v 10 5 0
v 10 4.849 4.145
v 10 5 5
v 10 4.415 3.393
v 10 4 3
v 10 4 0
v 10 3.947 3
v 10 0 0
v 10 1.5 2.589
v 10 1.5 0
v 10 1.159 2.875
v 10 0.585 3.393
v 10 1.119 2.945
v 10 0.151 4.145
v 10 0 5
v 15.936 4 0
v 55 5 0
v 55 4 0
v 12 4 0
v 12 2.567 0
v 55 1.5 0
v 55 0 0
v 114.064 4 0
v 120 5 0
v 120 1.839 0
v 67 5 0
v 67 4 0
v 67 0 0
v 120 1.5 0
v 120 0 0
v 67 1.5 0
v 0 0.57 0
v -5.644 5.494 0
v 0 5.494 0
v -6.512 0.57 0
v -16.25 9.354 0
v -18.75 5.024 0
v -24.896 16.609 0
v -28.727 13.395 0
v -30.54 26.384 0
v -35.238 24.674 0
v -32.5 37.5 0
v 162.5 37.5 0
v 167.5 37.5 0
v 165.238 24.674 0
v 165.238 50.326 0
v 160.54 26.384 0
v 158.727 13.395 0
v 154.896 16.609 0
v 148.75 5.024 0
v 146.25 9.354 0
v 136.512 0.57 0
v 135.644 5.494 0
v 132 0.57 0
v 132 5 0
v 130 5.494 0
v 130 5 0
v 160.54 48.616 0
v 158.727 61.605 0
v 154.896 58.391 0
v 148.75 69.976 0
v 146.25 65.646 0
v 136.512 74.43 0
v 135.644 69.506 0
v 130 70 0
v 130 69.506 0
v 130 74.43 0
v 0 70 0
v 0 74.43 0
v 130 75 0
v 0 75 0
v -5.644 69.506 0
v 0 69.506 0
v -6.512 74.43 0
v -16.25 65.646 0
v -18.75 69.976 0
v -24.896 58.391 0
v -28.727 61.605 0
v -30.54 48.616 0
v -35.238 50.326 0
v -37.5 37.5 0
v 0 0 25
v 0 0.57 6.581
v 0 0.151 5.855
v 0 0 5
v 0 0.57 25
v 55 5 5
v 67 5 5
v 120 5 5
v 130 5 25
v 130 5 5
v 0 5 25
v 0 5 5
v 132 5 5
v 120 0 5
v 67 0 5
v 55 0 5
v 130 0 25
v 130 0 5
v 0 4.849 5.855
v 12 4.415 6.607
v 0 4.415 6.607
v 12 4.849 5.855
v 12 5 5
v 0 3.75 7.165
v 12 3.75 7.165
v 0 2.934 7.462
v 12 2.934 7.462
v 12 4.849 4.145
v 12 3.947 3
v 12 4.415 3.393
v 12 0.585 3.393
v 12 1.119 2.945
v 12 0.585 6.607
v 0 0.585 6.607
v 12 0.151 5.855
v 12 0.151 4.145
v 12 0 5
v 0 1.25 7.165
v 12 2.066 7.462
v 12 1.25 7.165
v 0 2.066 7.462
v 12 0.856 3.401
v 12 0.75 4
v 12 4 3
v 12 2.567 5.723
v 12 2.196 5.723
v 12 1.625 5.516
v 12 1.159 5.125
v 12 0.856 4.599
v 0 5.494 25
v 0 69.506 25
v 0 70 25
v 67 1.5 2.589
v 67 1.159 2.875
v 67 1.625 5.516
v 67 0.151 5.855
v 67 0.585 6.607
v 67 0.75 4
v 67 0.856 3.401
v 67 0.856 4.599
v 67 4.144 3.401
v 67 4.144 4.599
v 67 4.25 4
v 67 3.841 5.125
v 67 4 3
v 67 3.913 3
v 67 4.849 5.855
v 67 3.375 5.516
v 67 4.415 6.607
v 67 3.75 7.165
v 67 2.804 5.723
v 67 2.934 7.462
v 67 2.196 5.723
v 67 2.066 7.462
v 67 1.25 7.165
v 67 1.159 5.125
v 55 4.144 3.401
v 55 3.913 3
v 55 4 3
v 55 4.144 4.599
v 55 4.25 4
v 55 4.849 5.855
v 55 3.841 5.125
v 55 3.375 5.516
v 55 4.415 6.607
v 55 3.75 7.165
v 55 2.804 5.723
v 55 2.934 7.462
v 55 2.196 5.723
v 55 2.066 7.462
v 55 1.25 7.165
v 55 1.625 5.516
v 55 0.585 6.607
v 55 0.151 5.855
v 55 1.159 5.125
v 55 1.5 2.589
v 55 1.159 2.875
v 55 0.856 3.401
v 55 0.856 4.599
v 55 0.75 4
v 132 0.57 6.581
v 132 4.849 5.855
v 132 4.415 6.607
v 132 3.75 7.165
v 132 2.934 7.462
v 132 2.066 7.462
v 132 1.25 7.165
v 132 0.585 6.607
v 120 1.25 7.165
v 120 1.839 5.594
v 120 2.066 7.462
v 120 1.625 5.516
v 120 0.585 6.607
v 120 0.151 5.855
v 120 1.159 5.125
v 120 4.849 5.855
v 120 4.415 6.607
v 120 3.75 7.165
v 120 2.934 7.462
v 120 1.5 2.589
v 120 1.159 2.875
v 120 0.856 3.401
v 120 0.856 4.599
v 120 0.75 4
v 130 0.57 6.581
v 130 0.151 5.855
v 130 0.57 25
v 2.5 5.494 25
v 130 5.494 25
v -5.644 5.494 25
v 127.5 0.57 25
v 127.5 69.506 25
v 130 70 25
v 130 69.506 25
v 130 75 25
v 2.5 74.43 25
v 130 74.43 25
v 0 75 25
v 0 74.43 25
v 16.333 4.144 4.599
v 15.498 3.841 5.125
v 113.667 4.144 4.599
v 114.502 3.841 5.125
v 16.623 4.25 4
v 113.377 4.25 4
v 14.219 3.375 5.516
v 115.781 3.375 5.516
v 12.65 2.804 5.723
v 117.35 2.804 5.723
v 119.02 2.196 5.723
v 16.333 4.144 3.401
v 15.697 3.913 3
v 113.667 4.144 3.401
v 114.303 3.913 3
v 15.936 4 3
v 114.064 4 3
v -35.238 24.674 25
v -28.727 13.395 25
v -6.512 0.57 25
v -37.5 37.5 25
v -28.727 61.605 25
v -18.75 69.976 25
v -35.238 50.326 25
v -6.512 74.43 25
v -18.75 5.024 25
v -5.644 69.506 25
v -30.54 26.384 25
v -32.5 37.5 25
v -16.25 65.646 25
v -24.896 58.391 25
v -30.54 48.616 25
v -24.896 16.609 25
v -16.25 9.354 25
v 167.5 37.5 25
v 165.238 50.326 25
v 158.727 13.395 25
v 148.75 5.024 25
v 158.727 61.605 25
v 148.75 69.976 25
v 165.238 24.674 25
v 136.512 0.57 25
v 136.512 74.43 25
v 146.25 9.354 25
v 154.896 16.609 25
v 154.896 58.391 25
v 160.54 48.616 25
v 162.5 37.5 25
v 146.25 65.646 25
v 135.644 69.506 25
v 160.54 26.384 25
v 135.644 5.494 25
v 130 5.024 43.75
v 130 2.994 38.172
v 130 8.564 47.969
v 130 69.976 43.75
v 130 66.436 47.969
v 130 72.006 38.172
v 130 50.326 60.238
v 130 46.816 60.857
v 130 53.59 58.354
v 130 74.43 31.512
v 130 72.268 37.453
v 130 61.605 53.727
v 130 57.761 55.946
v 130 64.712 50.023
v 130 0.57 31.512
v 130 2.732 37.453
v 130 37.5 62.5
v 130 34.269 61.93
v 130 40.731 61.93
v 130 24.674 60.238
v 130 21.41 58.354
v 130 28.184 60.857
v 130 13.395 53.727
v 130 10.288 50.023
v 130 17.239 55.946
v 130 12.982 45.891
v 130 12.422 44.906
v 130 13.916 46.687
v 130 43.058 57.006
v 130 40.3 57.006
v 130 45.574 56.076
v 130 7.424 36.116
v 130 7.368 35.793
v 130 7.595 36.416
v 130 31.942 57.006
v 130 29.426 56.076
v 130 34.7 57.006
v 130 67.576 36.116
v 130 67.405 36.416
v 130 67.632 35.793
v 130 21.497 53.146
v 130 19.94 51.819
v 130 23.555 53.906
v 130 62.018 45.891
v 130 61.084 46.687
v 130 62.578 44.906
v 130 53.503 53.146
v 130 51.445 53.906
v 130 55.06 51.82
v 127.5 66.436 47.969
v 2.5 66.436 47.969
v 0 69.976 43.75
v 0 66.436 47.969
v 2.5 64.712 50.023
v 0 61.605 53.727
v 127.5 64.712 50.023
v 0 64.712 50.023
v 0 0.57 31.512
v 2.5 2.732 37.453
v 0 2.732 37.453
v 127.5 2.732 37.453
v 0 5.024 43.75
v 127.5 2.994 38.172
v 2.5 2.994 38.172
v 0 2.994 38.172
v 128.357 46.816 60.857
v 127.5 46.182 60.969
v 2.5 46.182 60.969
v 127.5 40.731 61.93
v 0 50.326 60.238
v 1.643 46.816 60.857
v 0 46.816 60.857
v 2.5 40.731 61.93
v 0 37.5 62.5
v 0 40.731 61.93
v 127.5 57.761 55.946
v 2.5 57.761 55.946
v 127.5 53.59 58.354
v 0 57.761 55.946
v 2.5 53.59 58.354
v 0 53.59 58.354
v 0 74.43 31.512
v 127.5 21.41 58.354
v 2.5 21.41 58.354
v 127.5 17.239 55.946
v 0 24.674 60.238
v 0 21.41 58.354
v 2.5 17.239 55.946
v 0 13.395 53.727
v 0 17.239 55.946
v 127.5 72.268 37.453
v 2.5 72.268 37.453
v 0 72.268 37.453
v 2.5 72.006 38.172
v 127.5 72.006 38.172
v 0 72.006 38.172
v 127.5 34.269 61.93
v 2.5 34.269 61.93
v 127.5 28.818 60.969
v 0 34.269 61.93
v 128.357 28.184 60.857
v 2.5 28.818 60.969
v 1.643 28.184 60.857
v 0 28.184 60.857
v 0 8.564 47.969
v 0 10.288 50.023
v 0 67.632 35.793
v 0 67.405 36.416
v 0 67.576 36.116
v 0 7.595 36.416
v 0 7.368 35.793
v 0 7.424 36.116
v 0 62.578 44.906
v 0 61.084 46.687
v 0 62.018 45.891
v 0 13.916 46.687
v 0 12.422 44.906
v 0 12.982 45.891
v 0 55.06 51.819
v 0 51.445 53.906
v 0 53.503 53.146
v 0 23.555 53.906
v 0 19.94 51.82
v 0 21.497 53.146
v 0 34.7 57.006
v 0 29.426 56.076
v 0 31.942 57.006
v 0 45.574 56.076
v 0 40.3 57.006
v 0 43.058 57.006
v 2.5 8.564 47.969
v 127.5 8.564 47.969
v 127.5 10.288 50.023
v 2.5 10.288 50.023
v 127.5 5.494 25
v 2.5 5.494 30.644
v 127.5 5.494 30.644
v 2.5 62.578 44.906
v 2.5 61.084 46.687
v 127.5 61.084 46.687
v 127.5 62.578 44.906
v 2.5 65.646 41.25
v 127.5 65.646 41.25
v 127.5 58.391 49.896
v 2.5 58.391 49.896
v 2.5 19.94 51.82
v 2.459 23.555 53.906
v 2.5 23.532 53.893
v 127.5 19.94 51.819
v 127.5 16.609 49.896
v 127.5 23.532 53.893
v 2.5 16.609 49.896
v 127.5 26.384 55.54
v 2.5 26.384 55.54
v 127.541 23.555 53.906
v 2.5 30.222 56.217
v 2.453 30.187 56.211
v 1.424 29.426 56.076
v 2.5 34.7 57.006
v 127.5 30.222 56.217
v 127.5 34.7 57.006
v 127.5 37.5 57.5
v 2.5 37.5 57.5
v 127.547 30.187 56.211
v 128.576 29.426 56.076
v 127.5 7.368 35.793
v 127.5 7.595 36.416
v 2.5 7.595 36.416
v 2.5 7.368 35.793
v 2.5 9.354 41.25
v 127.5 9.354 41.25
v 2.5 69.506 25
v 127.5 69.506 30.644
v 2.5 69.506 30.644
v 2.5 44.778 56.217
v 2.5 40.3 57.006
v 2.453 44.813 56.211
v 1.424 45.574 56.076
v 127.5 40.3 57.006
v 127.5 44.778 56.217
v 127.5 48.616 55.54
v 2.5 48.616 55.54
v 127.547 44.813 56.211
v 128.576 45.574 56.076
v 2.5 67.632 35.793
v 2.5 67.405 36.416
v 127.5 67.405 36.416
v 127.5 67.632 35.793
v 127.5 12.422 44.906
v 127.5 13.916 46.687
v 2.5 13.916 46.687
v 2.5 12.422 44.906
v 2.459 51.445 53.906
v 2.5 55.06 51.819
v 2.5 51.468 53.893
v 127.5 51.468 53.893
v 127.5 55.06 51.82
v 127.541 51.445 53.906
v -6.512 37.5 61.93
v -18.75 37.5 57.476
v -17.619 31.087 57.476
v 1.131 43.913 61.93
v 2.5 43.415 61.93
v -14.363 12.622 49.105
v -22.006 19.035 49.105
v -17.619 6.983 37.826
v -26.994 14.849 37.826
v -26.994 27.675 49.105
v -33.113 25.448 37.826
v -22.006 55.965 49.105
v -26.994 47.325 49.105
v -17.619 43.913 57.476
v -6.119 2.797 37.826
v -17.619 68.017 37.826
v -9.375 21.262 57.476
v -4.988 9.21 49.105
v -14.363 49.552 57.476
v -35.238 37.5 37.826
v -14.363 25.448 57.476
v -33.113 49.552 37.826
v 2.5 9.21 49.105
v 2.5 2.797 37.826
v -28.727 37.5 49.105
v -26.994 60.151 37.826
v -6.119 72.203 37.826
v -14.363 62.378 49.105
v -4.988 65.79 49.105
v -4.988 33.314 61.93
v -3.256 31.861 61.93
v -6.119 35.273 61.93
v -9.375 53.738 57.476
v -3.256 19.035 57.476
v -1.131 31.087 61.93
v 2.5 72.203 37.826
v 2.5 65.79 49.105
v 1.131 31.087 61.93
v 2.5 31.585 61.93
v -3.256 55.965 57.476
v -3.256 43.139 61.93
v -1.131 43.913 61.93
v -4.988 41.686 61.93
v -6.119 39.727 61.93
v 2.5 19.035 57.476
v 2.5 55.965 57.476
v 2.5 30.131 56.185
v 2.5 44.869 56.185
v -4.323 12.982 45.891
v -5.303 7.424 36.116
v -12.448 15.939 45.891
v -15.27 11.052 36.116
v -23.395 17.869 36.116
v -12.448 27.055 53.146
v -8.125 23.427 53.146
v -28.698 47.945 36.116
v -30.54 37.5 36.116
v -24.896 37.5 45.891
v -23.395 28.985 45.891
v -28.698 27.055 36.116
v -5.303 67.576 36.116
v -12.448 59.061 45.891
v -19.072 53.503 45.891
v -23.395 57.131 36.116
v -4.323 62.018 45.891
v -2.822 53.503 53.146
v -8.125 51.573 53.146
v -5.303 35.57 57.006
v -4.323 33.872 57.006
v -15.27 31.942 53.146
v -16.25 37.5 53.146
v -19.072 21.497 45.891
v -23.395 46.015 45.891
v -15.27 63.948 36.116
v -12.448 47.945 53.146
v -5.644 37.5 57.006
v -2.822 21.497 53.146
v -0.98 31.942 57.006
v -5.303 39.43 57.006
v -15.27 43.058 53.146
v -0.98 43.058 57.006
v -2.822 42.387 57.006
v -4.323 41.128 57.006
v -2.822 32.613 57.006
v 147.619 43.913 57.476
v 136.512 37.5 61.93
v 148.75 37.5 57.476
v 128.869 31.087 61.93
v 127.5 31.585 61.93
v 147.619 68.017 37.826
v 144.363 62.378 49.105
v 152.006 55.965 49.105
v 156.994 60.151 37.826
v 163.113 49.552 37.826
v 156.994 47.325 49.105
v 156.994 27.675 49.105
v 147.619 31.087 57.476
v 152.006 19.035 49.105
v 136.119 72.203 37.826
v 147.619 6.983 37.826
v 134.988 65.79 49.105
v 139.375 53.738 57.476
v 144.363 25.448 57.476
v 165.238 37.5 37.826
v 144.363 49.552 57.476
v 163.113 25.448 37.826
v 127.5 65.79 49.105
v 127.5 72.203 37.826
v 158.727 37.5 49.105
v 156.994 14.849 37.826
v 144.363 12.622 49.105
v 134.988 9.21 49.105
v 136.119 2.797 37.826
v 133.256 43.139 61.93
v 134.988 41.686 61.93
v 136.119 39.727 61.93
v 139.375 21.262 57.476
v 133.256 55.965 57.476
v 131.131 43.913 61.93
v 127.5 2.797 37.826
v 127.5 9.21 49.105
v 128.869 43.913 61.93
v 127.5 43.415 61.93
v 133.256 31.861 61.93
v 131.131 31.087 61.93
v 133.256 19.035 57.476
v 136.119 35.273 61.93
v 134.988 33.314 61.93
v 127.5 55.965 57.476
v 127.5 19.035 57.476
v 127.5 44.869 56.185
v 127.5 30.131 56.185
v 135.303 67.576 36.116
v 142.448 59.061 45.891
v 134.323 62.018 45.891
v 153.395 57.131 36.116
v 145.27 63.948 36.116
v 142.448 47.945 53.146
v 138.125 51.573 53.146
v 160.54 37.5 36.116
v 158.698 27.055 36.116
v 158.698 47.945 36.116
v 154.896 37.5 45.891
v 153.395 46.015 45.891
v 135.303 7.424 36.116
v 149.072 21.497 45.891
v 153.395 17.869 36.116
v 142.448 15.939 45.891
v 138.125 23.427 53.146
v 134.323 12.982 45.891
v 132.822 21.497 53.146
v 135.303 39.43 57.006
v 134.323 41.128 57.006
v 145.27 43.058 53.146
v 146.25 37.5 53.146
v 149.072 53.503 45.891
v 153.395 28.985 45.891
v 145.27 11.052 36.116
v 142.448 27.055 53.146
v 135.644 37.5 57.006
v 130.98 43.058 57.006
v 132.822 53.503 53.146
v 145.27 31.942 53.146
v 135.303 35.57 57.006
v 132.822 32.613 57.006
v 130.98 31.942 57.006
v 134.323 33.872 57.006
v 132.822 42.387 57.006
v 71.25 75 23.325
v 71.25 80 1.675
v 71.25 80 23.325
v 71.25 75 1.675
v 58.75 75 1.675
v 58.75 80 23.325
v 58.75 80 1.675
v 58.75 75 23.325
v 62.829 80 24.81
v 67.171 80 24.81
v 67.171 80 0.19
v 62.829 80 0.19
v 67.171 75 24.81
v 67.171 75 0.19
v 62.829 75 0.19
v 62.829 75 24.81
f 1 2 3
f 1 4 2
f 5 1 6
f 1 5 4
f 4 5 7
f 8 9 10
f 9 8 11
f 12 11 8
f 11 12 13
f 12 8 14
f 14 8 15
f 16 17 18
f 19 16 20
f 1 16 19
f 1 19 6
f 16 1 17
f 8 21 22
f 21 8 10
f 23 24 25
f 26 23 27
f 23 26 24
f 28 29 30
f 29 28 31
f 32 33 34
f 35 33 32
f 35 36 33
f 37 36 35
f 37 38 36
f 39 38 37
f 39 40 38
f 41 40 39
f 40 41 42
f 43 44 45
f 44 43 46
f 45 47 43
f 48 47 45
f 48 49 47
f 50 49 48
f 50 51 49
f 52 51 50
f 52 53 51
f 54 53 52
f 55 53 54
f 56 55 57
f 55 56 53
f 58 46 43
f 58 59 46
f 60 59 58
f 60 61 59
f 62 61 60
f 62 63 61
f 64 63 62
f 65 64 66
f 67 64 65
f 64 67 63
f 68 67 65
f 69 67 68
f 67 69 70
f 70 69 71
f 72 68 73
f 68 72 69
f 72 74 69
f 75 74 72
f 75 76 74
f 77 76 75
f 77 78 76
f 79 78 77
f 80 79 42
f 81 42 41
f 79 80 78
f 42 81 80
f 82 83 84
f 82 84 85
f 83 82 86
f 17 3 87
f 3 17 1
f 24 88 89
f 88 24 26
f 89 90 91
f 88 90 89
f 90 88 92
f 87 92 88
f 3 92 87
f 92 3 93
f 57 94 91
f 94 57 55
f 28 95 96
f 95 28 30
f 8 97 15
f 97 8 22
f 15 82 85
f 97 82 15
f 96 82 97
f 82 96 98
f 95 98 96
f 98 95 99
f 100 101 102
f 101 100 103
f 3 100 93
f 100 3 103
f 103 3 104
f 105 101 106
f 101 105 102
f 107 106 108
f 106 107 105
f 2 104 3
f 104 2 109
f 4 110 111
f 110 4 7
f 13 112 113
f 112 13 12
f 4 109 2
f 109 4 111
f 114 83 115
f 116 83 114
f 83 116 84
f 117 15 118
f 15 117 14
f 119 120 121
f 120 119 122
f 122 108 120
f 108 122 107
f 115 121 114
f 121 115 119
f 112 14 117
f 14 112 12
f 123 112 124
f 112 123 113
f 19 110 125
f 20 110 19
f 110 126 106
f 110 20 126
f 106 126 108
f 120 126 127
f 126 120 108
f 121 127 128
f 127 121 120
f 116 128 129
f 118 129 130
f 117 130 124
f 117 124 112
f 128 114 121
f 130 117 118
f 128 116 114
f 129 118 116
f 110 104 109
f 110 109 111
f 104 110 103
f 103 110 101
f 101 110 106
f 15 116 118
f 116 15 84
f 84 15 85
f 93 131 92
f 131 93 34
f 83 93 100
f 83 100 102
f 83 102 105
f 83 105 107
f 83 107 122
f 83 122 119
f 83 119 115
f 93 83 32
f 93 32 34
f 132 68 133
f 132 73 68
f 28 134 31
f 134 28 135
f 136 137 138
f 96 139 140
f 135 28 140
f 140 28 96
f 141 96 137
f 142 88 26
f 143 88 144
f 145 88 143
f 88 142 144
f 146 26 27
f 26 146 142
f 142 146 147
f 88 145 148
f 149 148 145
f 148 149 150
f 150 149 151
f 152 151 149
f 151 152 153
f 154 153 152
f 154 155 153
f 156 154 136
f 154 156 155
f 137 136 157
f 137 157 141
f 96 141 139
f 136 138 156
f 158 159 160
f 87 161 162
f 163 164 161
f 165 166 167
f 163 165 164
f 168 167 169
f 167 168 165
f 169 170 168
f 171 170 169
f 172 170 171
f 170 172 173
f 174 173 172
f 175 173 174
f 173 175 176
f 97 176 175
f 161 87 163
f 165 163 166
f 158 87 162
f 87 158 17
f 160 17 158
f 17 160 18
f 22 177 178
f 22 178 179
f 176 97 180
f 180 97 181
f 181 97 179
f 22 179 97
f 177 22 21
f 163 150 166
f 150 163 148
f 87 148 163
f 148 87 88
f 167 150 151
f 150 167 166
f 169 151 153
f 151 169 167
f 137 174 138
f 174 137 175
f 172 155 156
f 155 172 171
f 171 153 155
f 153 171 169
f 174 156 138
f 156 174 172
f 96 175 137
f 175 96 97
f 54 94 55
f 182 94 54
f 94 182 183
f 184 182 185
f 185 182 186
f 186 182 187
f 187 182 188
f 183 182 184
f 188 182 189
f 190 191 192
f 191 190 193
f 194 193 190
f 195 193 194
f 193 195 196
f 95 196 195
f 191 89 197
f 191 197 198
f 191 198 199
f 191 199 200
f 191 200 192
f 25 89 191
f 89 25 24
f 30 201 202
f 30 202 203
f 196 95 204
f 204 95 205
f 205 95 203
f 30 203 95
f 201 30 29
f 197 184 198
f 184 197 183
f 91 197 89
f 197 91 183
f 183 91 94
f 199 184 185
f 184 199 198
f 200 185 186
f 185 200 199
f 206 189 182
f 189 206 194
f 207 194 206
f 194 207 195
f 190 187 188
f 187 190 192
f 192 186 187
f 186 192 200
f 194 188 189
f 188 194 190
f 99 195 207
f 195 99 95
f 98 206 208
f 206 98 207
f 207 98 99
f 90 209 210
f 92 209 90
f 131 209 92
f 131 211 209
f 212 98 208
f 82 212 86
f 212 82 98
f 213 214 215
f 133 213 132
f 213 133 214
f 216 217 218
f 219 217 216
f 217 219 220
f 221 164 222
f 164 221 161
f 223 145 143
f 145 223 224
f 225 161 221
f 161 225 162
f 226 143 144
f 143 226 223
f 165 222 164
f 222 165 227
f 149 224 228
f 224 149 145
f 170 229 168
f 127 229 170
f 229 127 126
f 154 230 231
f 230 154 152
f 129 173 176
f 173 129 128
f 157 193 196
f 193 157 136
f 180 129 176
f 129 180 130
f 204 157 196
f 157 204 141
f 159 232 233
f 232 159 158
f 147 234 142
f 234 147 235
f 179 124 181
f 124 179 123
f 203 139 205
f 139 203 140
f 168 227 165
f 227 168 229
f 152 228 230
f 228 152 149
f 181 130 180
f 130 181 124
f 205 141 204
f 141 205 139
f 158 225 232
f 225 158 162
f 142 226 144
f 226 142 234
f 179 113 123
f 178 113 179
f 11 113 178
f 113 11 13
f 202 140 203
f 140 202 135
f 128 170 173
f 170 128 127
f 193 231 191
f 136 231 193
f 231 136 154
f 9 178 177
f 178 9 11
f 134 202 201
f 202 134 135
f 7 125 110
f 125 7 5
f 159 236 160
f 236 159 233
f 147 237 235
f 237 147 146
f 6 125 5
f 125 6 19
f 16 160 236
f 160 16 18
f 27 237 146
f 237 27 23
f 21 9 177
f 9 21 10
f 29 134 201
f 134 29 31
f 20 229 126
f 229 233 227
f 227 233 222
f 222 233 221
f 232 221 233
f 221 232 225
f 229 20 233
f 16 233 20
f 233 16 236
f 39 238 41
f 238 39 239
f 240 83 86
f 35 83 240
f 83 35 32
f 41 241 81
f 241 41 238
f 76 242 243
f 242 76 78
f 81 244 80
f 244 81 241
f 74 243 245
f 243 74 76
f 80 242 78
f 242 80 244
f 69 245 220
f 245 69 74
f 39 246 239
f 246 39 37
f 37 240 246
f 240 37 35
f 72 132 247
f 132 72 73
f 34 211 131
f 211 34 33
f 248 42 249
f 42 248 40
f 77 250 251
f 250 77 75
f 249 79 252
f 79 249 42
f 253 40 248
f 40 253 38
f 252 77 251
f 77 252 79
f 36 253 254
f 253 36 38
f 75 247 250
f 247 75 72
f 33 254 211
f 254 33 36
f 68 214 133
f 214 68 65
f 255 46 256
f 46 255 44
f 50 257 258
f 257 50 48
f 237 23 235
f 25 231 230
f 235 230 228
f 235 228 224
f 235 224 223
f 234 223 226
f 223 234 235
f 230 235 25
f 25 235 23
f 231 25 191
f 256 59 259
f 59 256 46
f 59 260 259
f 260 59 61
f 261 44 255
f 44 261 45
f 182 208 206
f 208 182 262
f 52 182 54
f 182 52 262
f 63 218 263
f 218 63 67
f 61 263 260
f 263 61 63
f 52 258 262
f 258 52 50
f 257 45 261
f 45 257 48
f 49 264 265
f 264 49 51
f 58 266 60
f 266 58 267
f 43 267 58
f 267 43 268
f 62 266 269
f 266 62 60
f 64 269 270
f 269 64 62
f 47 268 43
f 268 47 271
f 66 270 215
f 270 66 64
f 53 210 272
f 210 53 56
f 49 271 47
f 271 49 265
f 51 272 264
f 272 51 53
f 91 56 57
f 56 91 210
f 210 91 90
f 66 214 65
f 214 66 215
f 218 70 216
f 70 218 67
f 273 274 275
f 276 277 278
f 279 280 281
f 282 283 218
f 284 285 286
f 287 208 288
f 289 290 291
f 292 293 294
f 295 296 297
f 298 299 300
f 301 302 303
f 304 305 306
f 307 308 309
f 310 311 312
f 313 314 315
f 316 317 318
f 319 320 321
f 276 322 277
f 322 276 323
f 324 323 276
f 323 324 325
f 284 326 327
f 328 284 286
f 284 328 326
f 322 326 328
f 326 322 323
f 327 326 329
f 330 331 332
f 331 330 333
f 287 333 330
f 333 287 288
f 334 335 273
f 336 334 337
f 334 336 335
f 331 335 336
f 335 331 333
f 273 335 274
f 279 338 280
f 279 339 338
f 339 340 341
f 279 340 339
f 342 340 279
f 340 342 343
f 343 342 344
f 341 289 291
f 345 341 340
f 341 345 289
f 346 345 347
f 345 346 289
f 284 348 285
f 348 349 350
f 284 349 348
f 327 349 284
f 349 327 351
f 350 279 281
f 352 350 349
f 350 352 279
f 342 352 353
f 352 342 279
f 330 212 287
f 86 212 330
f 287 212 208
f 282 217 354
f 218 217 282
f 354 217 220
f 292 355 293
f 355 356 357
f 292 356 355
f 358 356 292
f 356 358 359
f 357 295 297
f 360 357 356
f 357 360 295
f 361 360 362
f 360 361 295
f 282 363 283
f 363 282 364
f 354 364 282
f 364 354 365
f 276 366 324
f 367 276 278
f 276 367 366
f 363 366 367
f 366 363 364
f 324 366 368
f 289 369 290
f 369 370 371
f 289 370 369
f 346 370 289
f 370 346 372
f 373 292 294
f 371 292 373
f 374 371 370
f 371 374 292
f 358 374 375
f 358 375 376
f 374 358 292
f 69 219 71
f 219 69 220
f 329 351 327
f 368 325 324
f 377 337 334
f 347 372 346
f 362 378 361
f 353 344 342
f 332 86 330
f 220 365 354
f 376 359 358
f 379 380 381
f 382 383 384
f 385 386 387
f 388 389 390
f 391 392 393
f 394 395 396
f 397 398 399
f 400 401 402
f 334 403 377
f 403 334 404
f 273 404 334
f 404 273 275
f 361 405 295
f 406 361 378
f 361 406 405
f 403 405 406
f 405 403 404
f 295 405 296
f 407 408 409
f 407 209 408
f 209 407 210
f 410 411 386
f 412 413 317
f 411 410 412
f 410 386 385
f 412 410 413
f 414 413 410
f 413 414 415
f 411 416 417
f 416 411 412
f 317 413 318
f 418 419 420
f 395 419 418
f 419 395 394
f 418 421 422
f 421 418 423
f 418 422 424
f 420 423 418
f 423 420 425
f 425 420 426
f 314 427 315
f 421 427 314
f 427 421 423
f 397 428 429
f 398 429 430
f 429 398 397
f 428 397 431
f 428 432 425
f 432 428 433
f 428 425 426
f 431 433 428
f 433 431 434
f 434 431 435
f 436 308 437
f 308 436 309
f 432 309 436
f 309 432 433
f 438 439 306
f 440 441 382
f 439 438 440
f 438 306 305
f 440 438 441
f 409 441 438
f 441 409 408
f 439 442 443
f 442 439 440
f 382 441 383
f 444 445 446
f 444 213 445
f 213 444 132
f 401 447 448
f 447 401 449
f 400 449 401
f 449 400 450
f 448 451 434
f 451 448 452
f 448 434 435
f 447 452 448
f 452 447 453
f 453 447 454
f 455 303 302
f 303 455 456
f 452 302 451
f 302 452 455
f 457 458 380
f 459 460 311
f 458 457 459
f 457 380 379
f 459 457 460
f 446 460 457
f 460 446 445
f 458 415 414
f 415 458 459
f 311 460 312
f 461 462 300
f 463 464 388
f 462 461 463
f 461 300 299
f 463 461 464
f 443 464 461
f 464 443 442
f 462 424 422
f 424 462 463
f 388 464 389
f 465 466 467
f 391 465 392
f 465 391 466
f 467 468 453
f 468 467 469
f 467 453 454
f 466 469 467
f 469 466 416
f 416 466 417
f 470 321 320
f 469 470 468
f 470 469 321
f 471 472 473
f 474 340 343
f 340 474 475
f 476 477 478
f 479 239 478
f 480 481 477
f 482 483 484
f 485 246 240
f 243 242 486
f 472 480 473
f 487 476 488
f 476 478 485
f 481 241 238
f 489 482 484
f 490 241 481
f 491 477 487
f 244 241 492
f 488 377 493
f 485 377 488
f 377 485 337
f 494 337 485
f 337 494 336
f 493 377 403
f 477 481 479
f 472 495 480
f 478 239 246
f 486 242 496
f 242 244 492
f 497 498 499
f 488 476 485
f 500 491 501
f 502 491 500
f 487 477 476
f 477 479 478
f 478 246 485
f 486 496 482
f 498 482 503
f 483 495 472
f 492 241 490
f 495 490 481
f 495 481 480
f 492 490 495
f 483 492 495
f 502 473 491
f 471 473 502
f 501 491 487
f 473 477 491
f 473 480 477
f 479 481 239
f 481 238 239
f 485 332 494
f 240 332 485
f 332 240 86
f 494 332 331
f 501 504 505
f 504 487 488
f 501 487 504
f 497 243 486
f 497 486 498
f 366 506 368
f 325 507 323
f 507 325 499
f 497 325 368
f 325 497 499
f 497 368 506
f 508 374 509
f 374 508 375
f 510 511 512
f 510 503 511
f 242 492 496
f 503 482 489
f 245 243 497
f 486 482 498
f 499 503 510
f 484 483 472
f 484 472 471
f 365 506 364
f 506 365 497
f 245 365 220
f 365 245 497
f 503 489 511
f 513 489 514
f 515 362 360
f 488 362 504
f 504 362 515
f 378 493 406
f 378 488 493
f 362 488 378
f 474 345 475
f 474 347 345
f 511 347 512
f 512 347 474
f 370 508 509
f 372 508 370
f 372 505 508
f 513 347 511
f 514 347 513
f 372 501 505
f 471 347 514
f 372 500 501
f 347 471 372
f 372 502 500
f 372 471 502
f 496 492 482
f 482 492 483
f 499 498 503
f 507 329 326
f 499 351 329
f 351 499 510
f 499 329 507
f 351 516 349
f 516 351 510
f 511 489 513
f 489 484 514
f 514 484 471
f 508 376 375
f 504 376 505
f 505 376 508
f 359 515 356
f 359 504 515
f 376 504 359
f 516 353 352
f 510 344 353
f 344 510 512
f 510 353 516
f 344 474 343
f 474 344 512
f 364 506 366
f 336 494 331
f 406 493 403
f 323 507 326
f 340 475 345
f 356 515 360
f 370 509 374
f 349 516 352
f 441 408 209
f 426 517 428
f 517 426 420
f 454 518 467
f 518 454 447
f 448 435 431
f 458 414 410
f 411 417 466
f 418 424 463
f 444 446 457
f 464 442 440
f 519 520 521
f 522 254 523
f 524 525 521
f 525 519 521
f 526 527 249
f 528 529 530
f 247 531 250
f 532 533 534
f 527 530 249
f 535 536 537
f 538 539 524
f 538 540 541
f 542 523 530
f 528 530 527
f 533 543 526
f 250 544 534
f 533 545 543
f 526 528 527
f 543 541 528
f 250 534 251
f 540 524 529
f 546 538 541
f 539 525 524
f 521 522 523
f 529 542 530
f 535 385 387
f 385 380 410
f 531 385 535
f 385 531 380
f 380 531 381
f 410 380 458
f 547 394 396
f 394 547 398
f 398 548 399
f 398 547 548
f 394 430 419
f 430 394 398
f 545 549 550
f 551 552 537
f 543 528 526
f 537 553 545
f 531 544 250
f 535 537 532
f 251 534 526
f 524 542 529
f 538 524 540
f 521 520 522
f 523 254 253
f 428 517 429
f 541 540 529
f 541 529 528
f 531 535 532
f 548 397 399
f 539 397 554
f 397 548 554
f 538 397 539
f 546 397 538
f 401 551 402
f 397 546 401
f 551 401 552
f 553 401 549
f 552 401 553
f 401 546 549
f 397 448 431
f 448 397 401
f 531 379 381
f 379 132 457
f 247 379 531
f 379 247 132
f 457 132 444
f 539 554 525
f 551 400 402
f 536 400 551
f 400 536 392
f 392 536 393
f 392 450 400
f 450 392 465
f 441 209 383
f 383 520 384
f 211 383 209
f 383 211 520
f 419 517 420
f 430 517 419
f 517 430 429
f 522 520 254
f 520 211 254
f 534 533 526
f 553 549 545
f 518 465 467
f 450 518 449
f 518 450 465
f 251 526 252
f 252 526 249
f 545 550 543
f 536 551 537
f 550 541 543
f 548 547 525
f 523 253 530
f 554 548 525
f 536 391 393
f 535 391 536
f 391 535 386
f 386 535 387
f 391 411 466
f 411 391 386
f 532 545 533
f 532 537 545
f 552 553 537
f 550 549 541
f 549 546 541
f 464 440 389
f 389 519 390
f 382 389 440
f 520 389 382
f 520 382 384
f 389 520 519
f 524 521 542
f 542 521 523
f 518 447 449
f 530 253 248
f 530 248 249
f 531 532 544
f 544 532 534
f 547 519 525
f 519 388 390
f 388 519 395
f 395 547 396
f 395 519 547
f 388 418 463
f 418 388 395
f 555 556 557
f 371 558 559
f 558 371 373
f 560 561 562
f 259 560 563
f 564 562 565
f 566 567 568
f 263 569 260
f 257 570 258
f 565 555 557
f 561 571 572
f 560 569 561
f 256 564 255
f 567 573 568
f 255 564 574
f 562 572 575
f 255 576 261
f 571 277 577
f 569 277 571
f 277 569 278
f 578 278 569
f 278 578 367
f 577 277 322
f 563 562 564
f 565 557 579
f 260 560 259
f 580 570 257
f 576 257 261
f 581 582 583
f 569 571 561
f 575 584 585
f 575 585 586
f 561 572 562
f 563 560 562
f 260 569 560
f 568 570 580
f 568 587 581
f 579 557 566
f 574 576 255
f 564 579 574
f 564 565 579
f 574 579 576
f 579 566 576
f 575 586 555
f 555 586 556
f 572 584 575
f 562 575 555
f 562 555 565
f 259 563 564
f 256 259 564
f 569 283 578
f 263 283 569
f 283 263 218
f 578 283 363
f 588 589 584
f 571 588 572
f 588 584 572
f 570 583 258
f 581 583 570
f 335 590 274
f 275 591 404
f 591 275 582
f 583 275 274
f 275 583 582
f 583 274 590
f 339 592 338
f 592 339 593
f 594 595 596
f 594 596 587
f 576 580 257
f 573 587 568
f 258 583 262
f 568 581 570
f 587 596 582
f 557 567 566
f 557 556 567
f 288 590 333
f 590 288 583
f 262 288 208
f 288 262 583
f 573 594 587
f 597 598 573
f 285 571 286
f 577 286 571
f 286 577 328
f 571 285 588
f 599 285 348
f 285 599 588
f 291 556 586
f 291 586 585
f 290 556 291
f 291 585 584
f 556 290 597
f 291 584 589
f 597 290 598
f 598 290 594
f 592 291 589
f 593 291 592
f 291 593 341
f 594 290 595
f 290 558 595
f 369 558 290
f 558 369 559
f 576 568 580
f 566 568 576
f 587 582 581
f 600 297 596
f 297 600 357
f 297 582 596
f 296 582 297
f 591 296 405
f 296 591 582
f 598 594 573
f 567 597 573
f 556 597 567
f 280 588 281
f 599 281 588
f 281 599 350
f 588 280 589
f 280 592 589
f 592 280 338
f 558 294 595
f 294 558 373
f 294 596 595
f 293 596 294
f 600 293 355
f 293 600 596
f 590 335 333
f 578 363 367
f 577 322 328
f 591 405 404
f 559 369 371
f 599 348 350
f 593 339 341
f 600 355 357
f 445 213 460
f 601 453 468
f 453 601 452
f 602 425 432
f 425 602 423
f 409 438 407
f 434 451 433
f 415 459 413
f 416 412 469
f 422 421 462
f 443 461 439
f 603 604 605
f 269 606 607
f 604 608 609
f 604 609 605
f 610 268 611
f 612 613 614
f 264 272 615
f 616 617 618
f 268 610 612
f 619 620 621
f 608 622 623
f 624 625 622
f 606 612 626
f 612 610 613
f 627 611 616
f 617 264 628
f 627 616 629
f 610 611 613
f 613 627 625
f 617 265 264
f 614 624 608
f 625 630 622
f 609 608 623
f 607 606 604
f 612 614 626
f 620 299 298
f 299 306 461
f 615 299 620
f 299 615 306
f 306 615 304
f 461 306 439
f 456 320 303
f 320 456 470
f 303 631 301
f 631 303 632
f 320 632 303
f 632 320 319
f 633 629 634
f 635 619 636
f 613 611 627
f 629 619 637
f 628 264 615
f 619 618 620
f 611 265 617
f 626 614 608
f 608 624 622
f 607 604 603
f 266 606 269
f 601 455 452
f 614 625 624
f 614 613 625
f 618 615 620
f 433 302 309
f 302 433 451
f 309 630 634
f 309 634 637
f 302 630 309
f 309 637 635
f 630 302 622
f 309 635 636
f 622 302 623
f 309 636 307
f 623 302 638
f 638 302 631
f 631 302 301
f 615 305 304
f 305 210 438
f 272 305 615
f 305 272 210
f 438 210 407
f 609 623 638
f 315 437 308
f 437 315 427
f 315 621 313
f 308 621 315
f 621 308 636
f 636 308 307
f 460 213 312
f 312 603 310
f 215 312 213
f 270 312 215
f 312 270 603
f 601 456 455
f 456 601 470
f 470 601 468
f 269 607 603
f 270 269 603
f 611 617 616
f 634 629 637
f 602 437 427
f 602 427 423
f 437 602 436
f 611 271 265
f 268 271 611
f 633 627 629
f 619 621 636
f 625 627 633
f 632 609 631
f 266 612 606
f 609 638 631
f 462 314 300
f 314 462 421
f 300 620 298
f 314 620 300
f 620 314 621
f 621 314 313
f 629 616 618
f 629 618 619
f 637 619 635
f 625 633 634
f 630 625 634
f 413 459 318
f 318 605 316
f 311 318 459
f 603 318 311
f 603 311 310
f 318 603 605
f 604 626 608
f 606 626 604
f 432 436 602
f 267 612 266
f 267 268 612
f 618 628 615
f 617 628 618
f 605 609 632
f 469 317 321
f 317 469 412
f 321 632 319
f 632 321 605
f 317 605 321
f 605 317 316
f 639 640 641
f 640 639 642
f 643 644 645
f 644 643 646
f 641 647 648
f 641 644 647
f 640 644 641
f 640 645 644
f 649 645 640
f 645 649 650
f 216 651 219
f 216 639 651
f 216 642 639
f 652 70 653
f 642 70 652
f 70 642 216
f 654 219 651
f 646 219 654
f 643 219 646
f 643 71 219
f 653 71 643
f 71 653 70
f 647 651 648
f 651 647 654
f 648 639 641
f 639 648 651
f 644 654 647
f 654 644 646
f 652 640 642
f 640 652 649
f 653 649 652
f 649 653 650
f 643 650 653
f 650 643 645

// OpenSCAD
$fn=18.5;
hcoffre= 25;
lcoffrex= 130;
llamey= 5;
lcoffrey=70;


module head(coffrex,coffrey,coffrez){

	difference(){union(){difference(){cube([coffrex,llamey,coffrez]) ;
union(){union() {translate([0,0,0])cube([10,llamey,5]) ;

rotate([90,0,90])translate([llamey/2,llamey,0])cylinder(h=12,r=llamey/2) ;}


translate([lcoffrex/2-10,0,0])union() {translate([0,0,0])cube([12,llamey,5]) ;

rotate([90,0,90])translate([llamey/2,llamey,0])cylinder(h=12,r=llamey/2) ;}


translate([lcoffrex-10,0,0])union() {translate([0,0,0])cube([12,llamey,5]) ;

rotate([90,0,90])translate([llamey/2,llamey,0])cylinder(h=12,r=llamey/2) ;}}}}translate([0,llamey/2,4])rotate([90,0,90])cylinder(h=lcoffrex,r=llamey/4+0.5);translate([0,1.5,0])cube([lcoffrex,2.5,3]);}


translate([0,lcoffrey,0])cube([coffrex,llamey,coffrez]) ;

difference(){	union(){difference(){translate([0,lcoffrey/2+llamey/2,0])cylinder(h=hcoffre,r=lcoffrey/2+llamey/2);
translate([0,lcoffrey/2+llamey/2,0])cylinder(h=hcoffre,r=lcoffrey/2-llamey/2) ;translate([0,llamey,0])cube([lcoffrex/2-15,lcoffrey-llamey,hcoffre]); }}union() {translate([0,0,0])cube([12,llamey,5]) ;

rotate([90,0,90])translate([llamey/2,llamey,0])cylinder(h=12,r=llamey/2) ;}}

difference(){	union(){difference(){translate([lcoffrex,lcoffrey/2+llamey/2,0])cylinder(h=hcoffre,r=lcoffrey/2+llamey/2) ;
translate([lcoffrex,lcoffrey/2+llamey/2,0])cylinder(h=hcoffre,r=lcoffrey/2-llamey/2) ;translate([lcoffrex/2,llamey,0])cube([lcoffrex/2,lcoffrey-llamey,hcoffre]); }}union(){translate([lcoffrex-10,0,0])union() {translate([0,0,0])cube([12,llamey,5]) ;

rotate([90,0,90])translate([llamey/2,llamey,0])cylinder(h=12,r=llamey/2) ;}}}

translate([0,lcoffrey/2+llamey/2,hcoffre])rotate([0,90,0])difference(){cylinder(h=lcoffrex,r=lcoffrey/2+llamey/2);cylinder(h=lcoffrex,r=lcoffrey/2-llamey/2);translate([0,-lcoffrey/2+llamey/2,0])cube([lcoffrey/2+5,lcoffrey-llamey,lcoffrex]);}

translate([llamey/2,0,hcoffre])translate([0,lcoffrey+llamey])rotate([0,0,180])translate([-lcoffrey/2,0,-lcoffrey])difference(){translate([lcoffrey/2+llamey/2,lcoffrey/2+llamey/2,lcoffrey])sphere(d=lcoffrey+llamey);cube([lcoffrey+llamey,lcoffrey+llamey,lcoffrey]);cube([lcoffrey/2,lcoffrey+llamey,lcoffrey+lcoffrey/2+llamey]);translate([lcoffrey/2+llamey/2,lcoffrey/2+llamey/2,lcoffrey])sphere(d=lcoffrey-llamey);}

translate([lcoffrex-llamey/2,0,hcoffre])translate([-lcoffrey/2,0,-lcoffrey])difference(){translate([lcoffrey/2+llamey/2,lcoffrey/2+llamey/2,lcoffrey])sphere(d=lcoffrey+llamey);cube([lcoffrey+llamey,lcoffrey+llamey,lcoffrey]);cube([lcoffrey/2,lcoffrey+llamey,lcoffrey+lcoffrey/2+llamey]);translate([lcoffrey/2+llamey/2,lcoffrey/2+llamey/2,lcoffrey])sphere(d=lcoffrey-llamey);}

intersection(){translate([lcoffrex/2-hcoffre/4,lcoffrey+llamey,0])cube([hcoffre/2,llamey,hcoffre]);
translate([lcoffrex/2,lcoffrey+llamey+llamey,hcoffre/2])rotate([90,0,0])cylinder(h=llamey,r=hcoffre/2);}
}

translate([0,0,0])head(lcoffrex,lcoffrey,hcoffre);


